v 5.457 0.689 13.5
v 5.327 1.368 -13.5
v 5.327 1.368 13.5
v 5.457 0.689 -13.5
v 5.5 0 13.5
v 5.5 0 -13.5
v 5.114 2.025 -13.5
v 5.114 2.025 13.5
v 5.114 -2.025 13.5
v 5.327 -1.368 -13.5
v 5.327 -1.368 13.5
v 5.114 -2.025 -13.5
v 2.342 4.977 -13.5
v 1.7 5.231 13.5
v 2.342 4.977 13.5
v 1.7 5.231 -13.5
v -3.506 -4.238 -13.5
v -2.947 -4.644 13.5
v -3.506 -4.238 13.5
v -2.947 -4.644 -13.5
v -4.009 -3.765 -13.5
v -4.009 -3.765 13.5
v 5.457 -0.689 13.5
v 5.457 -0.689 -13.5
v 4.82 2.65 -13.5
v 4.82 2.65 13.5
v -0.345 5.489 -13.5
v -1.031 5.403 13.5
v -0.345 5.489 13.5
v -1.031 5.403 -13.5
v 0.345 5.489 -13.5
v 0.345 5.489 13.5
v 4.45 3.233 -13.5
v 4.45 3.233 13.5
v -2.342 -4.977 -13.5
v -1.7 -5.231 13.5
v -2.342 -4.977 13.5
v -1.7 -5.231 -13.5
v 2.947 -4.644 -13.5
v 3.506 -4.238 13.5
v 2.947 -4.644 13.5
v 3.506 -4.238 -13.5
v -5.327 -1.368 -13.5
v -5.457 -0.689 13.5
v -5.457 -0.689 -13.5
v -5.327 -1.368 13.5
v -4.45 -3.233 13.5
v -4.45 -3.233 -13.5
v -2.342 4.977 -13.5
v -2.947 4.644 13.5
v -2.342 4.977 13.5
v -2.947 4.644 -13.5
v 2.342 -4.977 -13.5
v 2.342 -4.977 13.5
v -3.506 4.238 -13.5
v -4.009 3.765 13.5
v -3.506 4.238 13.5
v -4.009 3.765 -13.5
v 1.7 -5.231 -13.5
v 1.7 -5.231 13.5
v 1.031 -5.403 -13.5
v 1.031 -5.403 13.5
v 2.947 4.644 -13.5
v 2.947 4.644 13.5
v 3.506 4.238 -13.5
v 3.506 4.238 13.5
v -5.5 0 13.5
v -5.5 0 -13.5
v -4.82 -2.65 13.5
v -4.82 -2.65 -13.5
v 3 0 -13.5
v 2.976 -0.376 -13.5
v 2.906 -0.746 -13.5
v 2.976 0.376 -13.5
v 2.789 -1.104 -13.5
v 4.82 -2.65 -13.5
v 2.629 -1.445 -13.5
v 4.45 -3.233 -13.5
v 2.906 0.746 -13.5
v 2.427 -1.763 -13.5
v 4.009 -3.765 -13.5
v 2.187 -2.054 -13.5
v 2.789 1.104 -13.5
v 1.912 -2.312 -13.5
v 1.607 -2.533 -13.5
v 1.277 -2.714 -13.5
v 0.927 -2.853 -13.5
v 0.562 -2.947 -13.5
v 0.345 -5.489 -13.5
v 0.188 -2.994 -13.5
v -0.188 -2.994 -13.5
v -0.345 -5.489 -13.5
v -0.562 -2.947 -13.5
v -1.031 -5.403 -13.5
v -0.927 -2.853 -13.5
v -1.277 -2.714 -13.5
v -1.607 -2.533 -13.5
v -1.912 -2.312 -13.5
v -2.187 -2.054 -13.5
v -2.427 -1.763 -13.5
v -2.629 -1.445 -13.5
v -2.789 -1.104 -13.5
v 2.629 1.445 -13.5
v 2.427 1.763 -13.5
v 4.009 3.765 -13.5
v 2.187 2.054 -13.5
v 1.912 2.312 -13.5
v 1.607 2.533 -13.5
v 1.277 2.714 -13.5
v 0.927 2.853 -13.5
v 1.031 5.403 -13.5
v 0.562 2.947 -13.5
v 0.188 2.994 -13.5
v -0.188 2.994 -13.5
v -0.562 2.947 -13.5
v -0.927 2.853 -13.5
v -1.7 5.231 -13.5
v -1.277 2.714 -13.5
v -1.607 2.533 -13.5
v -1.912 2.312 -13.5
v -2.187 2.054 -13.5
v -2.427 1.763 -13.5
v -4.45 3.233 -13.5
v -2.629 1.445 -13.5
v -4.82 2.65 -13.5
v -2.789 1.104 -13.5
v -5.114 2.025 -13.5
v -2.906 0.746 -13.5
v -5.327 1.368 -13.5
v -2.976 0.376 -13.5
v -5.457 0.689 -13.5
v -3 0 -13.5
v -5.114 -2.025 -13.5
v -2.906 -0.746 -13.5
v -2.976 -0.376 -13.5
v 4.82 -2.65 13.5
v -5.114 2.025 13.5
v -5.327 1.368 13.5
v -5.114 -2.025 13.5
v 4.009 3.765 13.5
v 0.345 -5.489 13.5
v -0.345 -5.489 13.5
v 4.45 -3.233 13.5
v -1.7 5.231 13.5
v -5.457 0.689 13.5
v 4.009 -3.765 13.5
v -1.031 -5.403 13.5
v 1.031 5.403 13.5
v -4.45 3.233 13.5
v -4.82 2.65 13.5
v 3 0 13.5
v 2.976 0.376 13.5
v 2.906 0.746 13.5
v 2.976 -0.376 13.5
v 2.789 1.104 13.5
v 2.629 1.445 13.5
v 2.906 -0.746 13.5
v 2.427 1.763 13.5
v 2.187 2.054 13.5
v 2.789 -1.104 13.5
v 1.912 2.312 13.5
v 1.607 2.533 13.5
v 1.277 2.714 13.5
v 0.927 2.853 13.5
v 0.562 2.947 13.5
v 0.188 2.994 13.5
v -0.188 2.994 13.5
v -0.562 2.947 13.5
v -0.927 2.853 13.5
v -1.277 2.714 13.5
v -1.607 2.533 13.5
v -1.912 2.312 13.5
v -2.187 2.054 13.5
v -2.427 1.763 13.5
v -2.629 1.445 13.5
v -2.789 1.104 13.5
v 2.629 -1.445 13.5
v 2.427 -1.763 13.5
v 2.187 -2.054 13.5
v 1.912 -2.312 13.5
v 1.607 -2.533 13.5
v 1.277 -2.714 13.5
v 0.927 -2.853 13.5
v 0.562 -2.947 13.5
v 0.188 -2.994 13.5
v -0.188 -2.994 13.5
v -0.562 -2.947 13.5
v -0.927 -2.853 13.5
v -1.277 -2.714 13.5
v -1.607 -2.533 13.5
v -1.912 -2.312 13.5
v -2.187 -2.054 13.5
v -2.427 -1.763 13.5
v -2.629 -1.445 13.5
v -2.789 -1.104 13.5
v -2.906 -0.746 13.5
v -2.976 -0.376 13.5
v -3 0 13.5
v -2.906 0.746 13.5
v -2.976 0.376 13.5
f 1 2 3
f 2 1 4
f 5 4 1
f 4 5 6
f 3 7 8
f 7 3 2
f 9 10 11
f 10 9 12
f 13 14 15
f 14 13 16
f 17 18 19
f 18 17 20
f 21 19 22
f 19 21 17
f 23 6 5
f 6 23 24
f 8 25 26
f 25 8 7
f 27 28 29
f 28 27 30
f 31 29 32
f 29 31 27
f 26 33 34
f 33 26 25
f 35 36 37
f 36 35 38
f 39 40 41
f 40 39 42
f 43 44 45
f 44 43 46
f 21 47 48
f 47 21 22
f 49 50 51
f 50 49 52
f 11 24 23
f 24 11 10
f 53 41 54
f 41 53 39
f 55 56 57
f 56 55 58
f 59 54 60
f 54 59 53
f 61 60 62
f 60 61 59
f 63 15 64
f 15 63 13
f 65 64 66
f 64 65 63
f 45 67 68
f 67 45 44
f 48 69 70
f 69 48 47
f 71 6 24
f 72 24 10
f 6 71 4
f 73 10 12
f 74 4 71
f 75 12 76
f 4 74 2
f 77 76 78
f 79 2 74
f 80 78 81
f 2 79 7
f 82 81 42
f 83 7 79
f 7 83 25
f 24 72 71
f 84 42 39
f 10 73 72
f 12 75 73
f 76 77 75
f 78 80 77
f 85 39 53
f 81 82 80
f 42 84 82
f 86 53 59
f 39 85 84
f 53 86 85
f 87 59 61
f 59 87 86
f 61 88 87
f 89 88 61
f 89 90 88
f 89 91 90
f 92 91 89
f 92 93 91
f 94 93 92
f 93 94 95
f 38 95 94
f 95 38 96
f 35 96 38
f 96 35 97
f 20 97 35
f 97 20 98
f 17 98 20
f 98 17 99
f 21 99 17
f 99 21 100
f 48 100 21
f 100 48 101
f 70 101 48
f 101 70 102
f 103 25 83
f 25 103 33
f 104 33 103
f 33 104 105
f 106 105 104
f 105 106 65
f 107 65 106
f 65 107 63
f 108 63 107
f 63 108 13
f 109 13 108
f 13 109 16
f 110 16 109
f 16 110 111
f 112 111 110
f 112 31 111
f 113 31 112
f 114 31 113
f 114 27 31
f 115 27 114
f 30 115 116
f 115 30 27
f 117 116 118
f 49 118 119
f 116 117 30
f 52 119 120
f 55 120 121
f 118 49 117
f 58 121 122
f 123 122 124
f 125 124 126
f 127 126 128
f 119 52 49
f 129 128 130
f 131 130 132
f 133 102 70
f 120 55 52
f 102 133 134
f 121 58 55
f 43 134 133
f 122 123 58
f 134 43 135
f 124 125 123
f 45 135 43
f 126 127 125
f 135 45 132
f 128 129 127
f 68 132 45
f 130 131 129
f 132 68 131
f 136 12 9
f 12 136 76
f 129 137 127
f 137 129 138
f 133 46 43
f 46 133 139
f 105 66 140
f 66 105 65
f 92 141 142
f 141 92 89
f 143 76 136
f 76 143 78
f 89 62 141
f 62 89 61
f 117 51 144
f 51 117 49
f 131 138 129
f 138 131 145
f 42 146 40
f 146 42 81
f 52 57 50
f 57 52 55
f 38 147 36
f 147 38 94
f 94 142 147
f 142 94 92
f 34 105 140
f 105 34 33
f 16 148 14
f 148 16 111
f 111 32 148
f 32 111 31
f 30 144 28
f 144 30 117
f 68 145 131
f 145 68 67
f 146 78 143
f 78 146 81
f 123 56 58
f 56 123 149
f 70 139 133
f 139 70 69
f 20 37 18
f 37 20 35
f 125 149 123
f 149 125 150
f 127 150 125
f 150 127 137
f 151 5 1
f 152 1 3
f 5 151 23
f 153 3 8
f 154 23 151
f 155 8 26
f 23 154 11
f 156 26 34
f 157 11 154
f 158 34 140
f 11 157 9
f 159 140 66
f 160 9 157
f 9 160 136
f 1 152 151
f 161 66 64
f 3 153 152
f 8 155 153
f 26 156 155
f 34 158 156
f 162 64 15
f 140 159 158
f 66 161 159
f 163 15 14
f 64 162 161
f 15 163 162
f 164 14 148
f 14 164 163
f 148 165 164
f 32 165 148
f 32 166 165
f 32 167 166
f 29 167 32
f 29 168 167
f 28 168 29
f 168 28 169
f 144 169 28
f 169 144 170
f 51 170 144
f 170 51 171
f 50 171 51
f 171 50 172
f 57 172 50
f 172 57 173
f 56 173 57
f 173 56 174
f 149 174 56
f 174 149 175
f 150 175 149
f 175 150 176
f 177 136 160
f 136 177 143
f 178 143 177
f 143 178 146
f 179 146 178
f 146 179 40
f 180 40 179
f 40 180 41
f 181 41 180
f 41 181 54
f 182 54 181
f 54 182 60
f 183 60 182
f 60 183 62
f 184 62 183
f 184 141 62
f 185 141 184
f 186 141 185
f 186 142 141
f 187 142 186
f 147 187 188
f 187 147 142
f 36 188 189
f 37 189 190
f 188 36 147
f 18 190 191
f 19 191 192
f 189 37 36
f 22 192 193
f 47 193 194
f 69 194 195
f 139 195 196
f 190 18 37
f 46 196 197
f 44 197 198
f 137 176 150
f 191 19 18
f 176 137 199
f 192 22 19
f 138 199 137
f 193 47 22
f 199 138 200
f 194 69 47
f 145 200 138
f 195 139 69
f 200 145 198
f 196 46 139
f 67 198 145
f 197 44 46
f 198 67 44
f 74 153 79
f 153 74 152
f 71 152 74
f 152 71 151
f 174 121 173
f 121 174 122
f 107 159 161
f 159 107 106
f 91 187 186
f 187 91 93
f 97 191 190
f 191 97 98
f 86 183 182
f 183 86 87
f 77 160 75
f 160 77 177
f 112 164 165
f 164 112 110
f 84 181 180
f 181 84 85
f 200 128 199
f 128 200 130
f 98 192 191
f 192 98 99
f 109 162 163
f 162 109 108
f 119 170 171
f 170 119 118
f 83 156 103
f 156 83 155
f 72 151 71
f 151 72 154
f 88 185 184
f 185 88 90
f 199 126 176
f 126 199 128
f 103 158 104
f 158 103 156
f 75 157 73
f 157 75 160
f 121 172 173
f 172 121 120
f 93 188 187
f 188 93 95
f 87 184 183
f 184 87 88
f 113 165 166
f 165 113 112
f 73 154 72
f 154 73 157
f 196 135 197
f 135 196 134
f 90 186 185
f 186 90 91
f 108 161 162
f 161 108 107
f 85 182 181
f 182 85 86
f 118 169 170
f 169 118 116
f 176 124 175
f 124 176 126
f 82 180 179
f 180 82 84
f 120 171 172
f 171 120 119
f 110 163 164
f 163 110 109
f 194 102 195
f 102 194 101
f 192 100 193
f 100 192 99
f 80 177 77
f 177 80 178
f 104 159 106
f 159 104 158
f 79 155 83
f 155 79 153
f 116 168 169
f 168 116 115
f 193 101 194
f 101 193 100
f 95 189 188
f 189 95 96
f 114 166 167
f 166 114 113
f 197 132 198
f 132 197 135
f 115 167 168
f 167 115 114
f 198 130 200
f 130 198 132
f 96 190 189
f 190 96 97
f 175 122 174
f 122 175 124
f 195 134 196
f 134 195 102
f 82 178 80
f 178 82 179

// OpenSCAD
$fn = 50;


difference() {
	union() {
		translate(v = [0, 0, -13.5000000000]) {
			cylinder(h = 27, r = 5.5000000000);
		}
	}
	union() {
		translate(v = [0, 0, -100.0000000000]) {
			cylinder(h = 200, r = 3.0000000000);
		}
	}
}
